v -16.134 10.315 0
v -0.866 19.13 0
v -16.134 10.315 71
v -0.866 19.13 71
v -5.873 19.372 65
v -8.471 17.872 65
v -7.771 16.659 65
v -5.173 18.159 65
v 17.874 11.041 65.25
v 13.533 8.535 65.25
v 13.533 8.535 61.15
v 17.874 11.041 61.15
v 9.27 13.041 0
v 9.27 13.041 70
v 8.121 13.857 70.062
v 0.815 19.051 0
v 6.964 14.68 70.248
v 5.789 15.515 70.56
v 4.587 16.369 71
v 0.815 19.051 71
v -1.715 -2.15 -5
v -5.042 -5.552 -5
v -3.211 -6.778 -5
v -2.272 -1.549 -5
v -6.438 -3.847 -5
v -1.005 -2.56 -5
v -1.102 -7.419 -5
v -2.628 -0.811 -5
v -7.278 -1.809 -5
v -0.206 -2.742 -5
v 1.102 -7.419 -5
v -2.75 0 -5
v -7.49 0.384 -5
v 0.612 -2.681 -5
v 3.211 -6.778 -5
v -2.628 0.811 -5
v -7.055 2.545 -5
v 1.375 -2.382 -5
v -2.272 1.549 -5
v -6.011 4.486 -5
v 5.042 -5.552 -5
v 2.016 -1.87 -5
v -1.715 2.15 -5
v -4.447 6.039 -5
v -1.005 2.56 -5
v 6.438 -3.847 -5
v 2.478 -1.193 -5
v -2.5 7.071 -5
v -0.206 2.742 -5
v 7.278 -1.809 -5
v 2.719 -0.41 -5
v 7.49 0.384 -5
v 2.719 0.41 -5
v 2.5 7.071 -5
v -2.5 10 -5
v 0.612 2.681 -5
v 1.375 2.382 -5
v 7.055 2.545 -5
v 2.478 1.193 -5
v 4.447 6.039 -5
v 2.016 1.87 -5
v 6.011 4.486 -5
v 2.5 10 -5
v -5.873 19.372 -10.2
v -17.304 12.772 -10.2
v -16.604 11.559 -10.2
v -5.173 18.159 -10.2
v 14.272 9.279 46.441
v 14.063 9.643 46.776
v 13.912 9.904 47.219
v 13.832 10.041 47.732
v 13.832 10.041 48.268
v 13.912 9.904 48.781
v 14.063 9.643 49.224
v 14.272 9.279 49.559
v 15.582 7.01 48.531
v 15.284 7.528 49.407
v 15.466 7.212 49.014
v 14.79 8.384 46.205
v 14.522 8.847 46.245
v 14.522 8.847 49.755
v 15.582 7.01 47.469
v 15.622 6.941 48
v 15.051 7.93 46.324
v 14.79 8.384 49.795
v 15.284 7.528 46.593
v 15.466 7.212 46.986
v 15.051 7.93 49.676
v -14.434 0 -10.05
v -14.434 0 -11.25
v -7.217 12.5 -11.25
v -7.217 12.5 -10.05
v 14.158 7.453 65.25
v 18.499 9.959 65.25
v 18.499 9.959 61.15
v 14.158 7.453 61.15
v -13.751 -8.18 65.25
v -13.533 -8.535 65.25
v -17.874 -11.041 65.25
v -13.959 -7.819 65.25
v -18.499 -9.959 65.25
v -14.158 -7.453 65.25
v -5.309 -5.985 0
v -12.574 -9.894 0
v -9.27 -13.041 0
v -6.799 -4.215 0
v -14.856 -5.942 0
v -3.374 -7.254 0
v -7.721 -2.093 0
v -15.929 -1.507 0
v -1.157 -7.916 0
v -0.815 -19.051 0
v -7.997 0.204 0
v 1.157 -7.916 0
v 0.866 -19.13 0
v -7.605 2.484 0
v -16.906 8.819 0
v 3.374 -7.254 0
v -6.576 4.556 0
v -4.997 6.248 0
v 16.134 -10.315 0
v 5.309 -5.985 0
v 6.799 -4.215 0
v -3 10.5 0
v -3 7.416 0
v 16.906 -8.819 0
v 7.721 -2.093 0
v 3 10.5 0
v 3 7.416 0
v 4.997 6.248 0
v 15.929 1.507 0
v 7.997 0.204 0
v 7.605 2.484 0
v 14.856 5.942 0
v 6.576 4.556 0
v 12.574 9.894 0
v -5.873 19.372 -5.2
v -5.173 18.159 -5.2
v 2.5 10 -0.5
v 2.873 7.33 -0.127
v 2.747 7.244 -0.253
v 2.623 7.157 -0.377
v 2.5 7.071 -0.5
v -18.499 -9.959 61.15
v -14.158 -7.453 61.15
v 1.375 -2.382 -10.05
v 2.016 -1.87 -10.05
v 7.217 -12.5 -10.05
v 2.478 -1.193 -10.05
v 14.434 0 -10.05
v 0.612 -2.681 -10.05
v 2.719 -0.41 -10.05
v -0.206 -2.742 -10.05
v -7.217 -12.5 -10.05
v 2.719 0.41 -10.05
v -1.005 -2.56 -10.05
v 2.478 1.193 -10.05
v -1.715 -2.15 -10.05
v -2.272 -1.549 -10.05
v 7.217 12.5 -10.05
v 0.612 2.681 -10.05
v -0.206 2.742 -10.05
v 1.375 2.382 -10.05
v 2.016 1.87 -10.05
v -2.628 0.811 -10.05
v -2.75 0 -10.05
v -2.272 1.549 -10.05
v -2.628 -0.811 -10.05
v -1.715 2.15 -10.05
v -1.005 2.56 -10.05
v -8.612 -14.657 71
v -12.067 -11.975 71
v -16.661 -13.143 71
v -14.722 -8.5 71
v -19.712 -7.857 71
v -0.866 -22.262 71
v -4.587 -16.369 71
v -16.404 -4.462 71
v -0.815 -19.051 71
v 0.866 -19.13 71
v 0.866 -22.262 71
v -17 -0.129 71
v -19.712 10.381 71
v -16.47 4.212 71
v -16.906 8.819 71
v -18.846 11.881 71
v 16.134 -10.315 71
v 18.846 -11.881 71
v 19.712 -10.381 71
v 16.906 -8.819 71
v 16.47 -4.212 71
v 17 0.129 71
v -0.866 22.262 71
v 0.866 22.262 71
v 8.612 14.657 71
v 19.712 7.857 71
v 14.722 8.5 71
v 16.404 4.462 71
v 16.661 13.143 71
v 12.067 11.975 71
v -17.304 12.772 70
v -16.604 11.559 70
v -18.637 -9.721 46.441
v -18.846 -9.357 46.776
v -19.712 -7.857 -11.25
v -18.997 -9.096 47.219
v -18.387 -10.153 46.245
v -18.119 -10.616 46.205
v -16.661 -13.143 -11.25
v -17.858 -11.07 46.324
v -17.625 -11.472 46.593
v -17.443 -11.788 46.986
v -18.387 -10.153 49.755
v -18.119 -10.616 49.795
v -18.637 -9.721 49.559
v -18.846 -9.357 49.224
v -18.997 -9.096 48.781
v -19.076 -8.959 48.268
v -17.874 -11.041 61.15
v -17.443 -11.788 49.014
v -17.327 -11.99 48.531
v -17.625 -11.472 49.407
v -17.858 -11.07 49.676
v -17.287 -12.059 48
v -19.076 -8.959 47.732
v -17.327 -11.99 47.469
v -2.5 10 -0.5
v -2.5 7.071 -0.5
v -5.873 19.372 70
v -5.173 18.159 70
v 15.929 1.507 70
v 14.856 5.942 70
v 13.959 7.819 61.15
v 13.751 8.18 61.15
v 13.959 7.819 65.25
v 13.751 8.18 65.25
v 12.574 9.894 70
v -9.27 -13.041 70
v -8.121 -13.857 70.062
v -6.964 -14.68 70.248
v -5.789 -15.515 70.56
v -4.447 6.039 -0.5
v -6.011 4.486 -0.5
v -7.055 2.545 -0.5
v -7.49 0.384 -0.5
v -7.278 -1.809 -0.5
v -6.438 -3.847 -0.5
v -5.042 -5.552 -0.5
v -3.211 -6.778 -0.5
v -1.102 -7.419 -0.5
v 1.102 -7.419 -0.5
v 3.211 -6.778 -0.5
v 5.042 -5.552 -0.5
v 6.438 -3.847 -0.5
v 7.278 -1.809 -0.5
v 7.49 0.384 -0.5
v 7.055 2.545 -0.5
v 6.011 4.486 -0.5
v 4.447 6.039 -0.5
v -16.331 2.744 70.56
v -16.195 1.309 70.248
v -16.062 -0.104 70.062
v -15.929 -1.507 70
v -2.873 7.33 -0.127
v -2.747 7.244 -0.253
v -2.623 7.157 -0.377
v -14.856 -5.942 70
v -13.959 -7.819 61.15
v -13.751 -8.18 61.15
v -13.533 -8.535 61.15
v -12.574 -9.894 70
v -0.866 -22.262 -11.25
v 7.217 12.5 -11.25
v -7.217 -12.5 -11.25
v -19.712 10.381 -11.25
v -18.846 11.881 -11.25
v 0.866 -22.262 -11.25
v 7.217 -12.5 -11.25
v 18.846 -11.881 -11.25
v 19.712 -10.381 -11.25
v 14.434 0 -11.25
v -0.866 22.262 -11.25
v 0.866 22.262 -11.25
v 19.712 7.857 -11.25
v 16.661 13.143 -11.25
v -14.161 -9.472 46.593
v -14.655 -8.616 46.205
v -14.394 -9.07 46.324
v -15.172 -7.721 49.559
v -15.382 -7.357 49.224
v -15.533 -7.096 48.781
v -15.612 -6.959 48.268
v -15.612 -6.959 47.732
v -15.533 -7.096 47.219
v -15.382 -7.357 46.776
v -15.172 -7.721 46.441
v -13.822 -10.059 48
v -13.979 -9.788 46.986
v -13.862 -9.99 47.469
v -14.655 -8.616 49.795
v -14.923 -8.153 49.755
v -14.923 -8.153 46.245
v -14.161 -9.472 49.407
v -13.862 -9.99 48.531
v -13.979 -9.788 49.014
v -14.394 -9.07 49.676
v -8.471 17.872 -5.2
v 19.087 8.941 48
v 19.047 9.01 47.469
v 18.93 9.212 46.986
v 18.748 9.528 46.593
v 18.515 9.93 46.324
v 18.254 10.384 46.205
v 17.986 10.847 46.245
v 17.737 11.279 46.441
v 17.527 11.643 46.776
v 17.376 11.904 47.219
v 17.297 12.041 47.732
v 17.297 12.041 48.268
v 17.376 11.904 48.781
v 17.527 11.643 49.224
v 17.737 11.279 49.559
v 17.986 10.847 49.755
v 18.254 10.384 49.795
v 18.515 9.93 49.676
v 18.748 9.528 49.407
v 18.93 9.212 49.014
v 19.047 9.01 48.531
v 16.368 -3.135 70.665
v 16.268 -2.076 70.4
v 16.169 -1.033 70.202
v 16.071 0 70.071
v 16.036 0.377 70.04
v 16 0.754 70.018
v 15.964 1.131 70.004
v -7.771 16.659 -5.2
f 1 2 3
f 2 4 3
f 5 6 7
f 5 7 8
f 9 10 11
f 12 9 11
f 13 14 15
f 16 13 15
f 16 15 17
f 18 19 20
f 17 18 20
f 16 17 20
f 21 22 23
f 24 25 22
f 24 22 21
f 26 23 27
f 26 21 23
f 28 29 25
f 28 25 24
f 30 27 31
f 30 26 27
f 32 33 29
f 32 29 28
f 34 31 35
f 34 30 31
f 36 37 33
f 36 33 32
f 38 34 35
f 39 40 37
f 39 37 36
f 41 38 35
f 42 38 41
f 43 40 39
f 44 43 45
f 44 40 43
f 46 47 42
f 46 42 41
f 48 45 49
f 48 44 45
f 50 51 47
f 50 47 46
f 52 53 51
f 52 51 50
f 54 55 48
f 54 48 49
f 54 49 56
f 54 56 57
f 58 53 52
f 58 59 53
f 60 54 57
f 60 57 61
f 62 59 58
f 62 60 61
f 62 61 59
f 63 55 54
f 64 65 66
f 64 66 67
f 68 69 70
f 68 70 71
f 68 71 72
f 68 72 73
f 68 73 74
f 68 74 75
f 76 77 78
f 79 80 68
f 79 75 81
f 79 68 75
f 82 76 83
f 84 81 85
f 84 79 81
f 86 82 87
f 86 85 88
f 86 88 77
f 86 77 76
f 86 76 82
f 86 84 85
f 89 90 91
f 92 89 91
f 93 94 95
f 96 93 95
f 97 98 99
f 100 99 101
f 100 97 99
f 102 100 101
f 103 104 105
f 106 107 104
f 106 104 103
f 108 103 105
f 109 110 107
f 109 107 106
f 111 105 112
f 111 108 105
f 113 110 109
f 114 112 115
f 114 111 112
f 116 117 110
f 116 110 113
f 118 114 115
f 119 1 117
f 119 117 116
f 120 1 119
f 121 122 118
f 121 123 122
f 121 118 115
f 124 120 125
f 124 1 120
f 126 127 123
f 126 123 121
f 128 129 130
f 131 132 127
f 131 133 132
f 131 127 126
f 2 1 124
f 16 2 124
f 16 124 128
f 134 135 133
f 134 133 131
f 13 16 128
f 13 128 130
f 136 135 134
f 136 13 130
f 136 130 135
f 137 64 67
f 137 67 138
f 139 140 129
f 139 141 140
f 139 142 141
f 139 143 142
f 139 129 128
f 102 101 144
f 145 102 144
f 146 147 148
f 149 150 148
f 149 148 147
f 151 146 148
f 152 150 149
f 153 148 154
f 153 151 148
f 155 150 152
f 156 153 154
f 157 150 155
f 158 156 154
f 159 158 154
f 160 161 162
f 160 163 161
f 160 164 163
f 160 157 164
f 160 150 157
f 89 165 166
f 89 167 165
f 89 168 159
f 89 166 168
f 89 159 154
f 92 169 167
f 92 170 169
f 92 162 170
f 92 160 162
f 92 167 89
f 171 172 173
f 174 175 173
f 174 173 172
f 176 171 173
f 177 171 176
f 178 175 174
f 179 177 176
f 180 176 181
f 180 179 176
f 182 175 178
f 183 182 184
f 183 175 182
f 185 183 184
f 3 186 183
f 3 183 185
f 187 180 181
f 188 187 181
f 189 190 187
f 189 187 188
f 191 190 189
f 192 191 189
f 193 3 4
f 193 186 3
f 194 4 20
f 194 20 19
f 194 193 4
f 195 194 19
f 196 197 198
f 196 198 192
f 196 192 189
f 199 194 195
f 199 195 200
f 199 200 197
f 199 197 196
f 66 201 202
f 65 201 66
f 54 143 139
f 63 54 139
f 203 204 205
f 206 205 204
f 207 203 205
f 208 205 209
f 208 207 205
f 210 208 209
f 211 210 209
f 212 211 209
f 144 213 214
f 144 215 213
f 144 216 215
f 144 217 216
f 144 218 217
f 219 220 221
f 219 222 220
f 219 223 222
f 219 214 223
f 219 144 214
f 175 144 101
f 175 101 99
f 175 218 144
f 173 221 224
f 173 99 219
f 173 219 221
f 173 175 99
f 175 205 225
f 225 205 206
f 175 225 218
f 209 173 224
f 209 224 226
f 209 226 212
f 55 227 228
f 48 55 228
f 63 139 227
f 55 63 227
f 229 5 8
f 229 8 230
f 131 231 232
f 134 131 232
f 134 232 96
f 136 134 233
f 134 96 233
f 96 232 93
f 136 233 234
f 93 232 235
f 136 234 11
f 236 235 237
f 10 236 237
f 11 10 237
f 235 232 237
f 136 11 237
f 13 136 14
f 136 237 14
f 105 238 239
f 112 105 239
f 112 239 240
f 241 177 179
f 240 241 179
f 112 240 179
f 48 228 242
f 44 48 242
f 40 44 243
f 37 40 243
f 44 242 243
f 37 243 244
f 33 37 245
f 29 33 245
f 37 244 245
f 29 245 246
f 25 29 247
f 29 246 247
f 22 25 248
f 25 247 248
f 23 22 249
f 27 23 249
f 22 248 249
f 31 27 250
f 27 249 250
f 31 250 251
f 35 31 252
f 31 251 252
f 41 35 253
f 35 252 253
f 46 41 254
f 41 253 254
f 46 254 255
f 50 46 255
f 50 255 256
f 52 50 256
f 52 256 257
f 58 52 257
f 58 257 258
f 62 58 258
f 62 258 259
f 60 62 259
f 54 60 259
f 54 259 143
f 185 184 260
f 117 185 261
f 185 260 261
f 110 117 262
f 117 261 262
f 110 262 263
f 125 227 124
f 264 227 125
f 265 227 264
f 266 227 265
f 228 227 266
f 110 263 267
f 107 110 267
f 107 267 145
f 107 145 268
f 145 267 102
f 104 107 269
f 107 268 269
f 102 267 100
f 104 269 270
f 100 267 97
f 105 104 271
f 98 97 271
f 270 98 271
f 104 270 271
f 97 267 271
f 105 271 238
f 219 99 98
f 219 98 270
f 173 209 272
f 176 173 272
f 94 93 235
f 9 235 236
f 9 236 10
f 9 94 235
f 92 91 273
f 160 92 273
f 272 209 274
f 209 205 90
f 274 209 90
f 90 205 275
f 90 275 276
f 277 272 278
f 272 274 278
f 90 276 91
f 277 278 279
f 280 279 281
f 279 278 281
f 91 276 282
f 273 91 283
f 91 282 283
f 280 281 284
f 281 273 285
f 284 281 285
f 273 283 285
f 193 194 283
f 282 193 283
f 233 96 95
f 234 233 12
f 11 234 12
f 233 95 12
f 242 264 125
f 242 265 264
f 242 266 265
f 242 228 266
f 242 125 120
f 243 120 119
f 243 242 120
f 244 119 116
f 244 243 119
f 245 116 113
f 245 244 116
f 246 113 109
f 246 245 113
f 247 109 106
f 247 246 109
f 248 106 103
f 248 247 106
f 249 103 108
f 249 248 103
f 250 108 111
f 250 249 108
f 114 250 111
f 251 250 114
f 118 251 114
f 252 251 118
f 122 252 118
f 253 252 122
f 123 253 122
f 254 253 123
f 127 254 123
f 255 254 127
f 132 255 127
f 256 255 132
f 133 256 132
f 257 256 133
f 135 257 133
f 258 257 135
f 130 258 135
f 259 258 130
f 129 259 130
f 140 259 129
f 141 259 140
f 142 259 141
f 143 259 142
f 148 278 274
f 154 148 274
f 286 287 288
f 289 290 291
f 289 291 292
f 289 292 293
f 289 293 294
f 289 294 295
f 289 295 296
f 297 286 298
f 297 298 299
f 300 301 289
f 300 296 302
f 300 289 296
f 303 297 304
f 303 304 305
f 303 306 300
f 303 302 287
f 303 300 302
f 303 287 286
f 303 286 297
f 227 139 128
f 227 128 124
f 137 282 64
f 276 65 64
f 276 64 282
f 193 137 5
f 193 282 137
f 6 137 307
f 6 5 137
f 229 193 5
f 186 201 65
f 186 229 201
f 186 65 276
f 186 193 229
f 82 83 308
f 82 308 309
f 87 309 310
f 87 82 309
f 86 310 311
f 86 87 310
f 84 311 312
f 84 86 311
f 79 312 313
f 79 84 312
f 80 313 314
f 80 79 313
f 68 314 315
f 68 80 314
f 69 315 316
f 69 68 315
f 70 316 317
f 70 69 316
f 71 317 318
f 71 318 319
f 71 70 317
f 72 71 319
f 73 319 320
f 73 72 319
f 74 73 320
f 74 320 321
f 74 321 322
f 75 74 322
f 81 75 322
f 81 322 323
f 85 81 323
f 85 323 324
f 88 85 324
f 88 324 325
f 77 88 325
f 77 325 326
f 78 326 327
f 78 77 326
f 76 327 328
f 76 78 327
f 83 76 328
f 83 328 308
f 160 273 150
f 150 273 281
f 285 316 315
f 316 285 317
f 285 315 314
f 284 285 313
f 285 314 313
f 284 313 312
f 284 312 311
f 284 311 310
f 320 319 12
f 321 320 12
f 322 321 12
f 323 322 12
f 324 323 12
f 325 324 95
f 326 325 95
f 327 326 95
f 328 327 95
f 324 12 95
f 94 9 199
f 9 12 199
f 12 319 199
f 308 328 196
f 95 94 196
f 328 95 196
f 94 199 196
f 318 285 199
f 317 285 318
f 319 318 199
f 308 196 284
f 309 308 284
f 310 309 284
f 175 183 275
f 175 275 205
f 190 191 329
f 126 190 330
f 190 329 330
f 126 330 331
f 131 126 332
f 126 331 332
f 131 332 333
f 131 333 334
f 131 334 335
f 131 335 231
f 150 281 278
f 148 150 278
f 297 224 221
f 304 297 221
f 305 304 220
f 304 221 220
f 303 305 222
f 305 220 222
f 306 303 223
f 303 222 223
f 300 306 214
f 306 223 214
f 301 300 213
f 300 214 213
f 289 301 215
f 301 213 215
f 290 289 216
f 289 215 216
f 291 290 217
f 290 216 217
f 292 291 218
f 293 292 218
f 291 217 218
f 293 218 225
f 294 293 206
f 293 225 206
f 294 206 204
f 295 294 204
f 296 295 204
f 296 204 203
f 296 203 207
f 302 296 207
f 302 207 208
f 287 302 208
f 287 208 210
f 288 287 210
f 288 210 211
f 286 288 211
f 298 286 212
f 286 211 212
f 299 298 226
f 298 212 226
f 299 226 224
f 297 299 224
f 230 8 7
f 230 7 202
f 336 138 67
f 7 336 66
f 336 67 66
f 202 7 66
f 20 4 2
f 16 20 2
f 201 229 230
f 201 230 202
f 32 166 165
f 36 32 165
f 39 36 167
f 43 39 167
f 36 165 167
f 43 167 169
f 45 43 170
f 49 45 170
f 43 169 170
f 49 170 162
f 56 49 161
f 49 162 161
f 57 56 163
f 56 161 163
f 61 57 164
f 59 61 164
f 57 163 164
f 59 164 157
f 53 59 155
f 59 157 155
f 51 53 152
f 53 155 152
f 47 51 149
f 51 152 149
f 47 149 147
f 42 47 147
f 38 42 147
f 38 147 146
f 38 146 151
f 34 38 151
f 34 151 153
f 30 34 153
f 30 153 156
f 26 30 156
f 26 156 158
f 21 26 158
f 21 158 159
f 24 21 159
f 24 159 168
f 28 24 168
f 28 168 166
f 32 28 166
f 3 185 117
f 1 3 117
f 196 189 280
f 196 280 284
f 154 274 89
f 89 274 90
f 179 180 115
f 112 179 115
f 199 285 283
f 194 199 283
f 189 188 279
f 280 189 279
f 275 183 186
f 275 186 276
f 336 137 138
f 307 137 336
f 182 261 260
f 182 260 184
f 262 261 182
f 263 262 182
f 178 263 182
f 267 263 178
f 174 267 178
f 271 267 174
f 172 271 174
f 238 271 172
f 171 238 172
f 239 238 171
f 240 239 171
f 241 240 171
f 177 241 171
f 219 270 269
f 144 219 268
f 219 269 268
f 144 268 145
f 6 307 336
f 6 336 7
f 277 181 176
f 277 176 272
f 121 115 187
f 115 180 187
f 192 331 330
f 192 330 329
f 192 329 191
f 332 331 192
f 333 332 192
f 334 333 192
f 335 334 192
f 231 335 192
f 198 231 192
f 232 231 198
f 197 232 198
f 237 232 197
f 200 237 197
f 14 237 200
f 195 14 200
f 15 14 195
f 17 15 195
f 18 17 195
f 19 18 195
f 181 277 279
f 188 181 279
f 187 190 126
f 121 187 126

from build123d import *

# Parameters (mm, degrees)
SKETCH2_R               = 16
BOSS_EXTRUDE1_DEPTH     = 82.25
CUT_EXTRUDE1_DEPTH      = 97.457244414
CUT_EXTRUDE1_DEPTH_BACK = 97.457244414
SKETCH3_W               = 152.01959988
SKETCH3_H               = 124.433031562
CUT_EXTRUDE2_DEPTH      = 1.4
CHAMFER2_SIZE           = 1
CHAMFER3_SIZE           = 1
CUT_EXTRUDE3_DEPTH      = 71
CHAMFER4_SIZE           = 1
CUT_EXTRUDE4_DEPTH      = 1.2
SKETCH8_R               = 2.75
CUT_EXTRUDE5_DEPTH      = 87.332400234
CUT_EXTRUDE7_DEPTH      = 5
CHAMFER5_SIZE           = 0.5
CUT_EXTRUDE8_DEPTH      = 88.459952722
SKETCH12_R              = 1.8
CUT_EXTRUDE9_DEPTH      = 4
CUT_EXTRUDE10_START     = -4
SKETCH13_R              = 1.8
CUT_EXTRUDE10_DEPTH     = 4
SKETCH14_W              = 4.1
SKETCH14_H              = 1.25
CUT_EXTRUDE11_DEPTH     = 87.894692785


with BuildPart() as part:
    # Sketch1 → Revolve1 (revolve)
    with BuildSketch(Plane(origin=(0, 0, 0), x_dir=(1, 0, 0), z_dir=(0, 1, 0))):
        Polygon((0, 0), (16.125, 0), (16.125, -71), (19.65, -71), (19.65, 68), (24.95, 68), (24.95, 73), (28.1, 73), (28.1, 68), (42, 68), (42, 76), (16.65, 76), (16.65, 18.004366875), (12.193967069, 18.004366875), (12.193967069, 24.882682167), (0, 24.882682167), align=None)
    revolve(axis=Axis((0, 0, 39.840023079), (0, 0, -1)))

    # Sketch2 → Boss-Extrude1 (add)
    with BuildSketch(Plane.XY.offset(71)):
        Polygon((0, 22.762034363), (-19.7125, 11.381017181), (-19.7125, -11.381017181), (0, -22.762034363), (19.7125, -11.381017181), (19.7125, 11.381017181), align=None)
        Circle(SKETCH2_R, mode=Mode.SUBTRACT)
    extrude(amount=-BOSS_EXTRUDE1_DEPTH)

    # Sketch3 → Cut-Extrude1 (cut, two sides: drawn at the far end of the back side and taken through both)
    with BuildSketch(Plane(origin=(0, 0, 0), x_dir=(1, 0, 0), z_dir=(0, 1, 0)).offset(-CUT_EXTRUDE1_DEPTH_BACK)):
        with Locations((6.162956752, 73.466515781)):
            Rectangle(SKETCH3_W, SKETCH3_H)
    extrude(amount=CUT_EXTRUDE1_DEPTH + CUT_EXTRUDE1_DEPTH_BACK, mode=Mode.SUBTRACT)

    # Sketch4 → Cut-Extrude2 (cut)
    with BuildSketch(Plane(origin=(-9.85625, 17.071525772, 0), x_dir=(0.8660254037844386, 0.5000000000000003, 0), z_dir=(-0.5000000000000002, 0.8660254037844385, 0))):
        Polygon((-8.6, 10.2), (4.6, 10.2), (4.6, 5.2), (1.6, 5.2), (1.6, -65), (4.6, -65), (4.6, -70), (-8.6, -70), align=None)
    extrude(amount=-CUT_EXTRUDE2_DEPTH, mode=Mode.SUBTRACT)

    # Chamfer2
    chamfer2_edges = [part.edges().sort_by_distance(p)[0] for p in [
        (0, 22.762034363, 29.875),
        (19.7125, 11.381017181, 29.875),
        (19.7125, -11.381017181, 29.875),
        (0, -22.762034363, 29.875),
        (-19.7125, -11.381017181, 29.875),
        (-19.7125, 11.381017181, 29.875),
    ]]
    chamfer(chamfer2_edges, length=CHAMFER2_SIZE)

    # Chamfer3
    chamfer3_edges = [part.edges().sort_by_distance(p)[0] for p in [
        (-16, 0, 71),
    ]]
    chamfer(chamfer3_edges, length=CHAMFER3_SIZE)

    # Sketch5 → Cut-Extrude3 (cut)
    with BuildSketch(Plane.XY.offset(71)):
        with BuildLine():
            Line((-17, 9.814954576), (-15.92887426, -1.50697207))
            ThreePointArc((-15.92887426, -1.50697207), (-8, 13.85640646), (9.269513225, 13.041323728))
            Line((9.269513225, 13.041323728), (0, 19.629909152))
            Line((0, 19.629909152), (-17, 9.814954576))
        make_face()
        with BuildLine():
            Line((0, -19.629909152), (17, -9.814954576))
            Line((17, -9.814954576), (15.92887426, 1.50697207))
            ThreePointArc((15.92887426, 1.50697207), (8, -13.856406461), (-9.269513225, -13.041323728))
            Line((-9.269513225, -13.041323728), (0, -19.629909152))
        make_face()
    extrude(amount=-CUT_EXTRUDE3_DEPTH, mode=Mode.SUBTRACT)

    # Chamfer4
    chamfer4_edges = [part.edges().sort_by_distance(p)[0] for p in [
        (0, -19.629909152, 35.5),
        (17, -9.814954576, 35.5),
        (0, 19.629909152, 35.5),
        (-17, 9.814954576, 35.5),
    ]]
    chamfer(chamfer4_edges, length=CHAMFER4_SIZE)

    # Sketch6 → Cut-Extrude4 (cut)
    with BuildSketch(Plane(origin=(0, 0, -11.25), x_dir=(-1, 0, 0), z_dir=(0, 0, -1))):
        Polygon((-7.216878365, 12.5), (-14.43375673, 0), (-7.216878365, -12.5), (7.216878365, -12.5), (14.43375673, 0), (7.216878365, 12.5), align=None)
    extrude(amount=-CUT_EXTRUDE4_DEPTH, mode=Mode.SUBTRACT)

    # Sketch8 → Cut-Extrude5 (cut, through all)
    with BuildSketch(Plane(origin=(0, 0, -10.05), x_dir=(-1, 0, 0), z_dir=(0, 0, -1))):
        Circle(SKETCH8_R)
    extrude(amount=-CUT_EXTRUDE5_DEPTH, mode=Mode.SUBTRACT)

    # Sketch10 → Cut-Extrude7 (cut)
    with BuildSketch(Plane.XY):
        with BuildLine():
            Line((2.5, 10), (-2.5, 10))
            Line((-2.5, 10), (-2.5, 7.071067812))
            ThreePointArc((-2.5, 7.071067812), (0, -7.5), (2.5, 7.071067812))
            Line((2.5, 7.071067812), (2.5, 10))
        make_face()
    extrude(amount=-CUT_EXTRUDE7_DEPTH, mode=Mode.SUBTRACT)

    # Chamfer5
    chamfer5_edges = [part.edges().sort_by_distance(p)[0] for p in [
        (0, -7.5, 0),
        (2.5, 8.535533906, 0),
        (0, 10, 0),
        (-2.5, 8.535533906, 0),
    ]]
    chamfer(chamfer5_edges, length=CHAMFER5_SIZE)

    # Sketch11 → Cut-Extrude8 (cut, through all)
    with BuildSketch(Plane.XY.offset(71)):
        Polygon((19.7125, 11.381017181), (16.660566959, 13.143051544), (19.7125, 7.856948456), align=None)
        Polygon((-16.660566959, -13.143051544), (-19.7125, -11.381017181), (-19.7125, -7.856948456), align=None)
    extrude(amount=-CUT_EXTRUDE8_DEPTH, mode=Mode.SUBTRACT)

    # Sketch12 → Cut-Extrude9 (cut)
    with BuildSketch(Plane(origin=(-18.186533479, -10.5, 0), x_dir=(0, 0, 1), z_dir=(-0.8660254037844382, -0.500000000000001, 0))):
        with Locations(Location((48, 0, 0), (0, 0, 270))):
            Circle(SKETCH12_R)
    extrude(amount=-CUT_EXTRUDE9_DEPTH, mode=Mode.SUBTRACT)

    # Sketch13 → Cut-Extrude10 (cut)
    with BuildSketch(Plane(origin=(18.186533479, 10.5, 0), x_dir=(0, 0, -1), z_dir=(0.8660254037844387, 0.4999999999999999, 0)).offset(CUT_EXTRUDE10_START)):
        with Locations(Location((-48, 0, 0), (0, 0, 270))):
            Circle(SKETCH13_R)
    extrude(amount=CUT_EXTRUDE10_DEPTH, mode=Mode.SUBTRACT)

    # Sketch14 → Cut-Extrude11 (cut, through all)
    with BuildSketch(Plane(origin=(18.186533479, 10.5, 0), x_dir=(0, 0, -1), z_dir=(0.8660254037844387, 0.4999999999999999, 0))):
        with Locations((-63.2, 0)):
            Rectangle(SKETCH14_W, SKETCH14_H)
    extrude(amount=-CUT_EXTRUDE11_DEPTH, mode=Mode.SUBTRACT)


solid = part.part
